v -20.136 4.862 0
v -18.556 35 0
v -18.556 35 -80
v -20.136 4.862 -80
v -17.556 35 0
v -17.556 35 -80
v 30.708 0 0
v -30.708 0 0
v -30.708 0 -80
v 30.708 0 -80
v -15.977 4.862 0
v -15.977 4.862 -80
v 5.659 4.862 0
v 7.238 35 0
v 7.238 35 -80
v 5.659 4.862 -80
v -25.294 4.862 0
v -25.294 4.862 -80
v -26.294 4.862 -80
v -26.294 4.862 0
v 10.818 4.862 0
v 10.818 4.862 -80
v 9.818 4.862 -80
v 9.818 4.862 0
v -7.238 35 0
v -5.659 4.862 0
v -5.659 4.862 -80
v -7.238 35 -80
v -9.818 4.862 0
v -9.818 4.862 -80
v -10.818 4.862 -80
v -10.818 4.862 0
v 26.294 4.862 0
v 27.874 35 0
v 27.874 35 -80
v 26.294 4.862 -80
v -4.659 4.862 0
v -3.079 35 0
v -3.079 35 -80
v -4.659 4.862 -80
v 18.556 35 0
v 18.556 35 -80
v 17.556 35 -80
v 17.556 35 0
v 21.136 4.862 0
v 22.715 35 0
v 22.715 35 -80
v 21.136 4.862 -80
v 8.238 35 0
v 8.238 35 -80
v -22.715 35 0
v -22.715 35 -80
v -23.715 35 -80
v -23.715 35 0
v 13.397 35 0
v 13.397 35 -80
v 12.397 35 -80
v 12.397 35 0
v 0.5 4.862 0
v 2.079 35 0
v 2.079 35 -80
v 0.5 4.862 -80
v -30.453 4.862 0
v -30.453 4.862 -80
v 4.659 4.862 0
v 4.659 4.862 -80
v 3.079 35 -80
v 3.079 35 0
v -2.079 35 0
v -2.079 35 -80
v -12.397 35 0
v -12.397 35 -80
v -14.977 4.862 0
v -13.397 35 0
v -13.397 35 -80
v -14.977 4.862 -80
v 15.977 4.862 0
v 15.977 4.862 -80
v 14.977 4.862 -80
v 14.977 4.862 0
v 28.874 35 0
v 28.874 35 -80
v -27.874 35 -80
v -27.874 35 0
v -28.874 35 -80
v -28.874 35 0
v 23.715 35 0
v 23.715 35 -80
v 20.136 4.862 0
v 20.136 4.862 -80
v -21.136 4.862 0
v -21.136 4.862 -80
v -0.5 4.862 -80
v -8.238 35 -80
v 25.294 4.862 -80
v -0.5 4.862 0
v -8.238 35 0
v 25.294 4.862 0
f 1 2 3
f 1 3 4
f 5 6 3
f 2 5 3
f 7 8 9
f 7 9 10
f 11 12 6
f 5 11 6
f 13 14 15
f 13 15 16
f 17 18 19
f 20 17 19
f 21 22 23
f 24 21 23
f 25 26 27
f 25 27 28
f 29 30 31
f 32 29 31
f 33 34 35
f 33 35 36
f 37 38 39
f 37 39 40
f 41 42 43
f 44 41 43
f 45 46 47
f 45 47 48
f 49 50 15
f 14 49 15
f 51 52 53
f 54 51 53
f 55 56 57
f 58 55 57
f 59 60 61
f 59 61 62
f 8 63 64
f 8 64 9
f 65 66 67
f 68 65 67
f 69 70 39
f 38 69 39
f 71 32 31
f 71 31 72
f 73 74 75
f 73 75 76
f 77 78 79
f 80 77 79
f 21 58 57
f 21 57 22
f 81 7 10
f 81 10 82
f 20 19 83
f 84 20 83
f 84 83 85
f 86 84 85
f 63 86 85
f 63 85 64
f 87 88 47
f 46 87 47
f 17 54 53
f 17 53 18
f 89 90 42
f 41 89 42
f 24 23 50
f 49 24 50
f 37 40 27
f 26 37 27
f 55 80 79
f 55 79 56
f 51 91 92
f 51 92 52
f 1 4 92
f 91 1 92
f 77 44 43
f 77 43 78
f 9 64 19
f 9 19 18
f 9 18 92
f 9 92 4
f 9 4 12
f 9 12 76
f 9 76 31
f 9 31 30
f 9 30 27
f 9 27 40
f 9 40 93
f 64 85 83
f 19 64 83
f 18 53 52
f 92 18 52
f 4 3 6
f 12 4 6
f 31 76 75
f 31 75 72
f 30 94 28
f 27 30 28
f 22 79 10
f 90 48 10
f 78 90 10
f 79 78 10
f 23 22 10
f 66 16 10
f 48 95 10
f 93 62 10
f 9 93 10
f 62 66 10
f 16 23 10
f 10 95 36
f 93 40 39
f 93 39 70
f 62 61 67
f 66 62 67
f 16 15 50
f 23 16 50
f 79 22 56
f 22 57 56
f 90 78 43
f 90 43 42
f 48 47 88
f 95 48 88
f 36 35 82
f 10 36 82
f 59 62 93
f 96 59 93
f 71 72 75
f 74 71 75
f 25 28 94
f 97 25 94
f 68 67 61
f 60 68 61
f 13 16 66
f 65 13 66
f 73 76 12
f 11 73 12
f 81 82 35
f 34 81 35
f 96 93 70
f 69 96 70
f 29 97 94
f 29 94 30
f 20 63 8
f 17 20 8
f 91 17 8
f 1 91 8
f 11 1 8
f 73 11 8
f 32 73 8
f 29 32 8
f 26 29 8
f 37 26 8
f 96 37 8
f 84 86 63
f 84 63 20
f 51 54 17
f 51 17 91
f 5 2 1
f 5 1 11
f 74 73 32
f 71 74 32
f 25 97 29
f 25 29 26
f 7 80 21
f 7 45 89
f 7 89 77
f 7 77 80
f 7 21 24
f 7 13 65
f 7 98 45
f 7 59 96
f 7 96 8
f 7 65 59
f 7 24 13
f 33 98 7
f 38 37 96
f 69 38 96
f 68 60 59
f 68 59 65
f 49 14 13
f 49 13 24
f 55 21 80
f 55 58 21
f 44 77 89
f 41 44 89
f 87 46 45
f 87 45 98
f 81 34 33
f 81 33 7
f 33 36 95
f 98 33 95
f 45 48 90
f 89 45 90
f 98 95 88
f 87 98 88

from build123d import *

# Parameters (mm, degrees)
DODANIE_WYCI_GNI_CIE1_DEPTH = 80


with BuildPart() as part:
    # Szkic1 → Dodanie-wyciągnięcie1 (new body)
    with BuildSketch(Plane.XY):
        Polygon((-30.708202586, 0), (30.708202586, 0), (28.873930311, 35), (27.873930311, 35), (26.294482101, 4.862332812), (25.294482101, 4.862332812), (23.715033891, 35), (22.715033891, 35), (21.135585681, 4.862332812), (20.135585681, 4.862332812), (18.556137471, 35), (17.556137471, 35), (15.976689261, 4.862332812), (14.976689261, 4.862332812), (13.39724105, 35), (12.39724105, 35), (10.81779284, 4.862332812), (9.81779284, 4.862332812), (8.23834463, 35), (7.23834463, 35), (5.65889642, 4.862332812), (4.65889642, 4.862332812), (3.07944821, 35), (2.07944821, 35), (0.5, 4.862332812), (-0.5, 4.862332812), (-2.07944821, 35), (-3.07944821, 35), (-4.65889642, 4.862332812), (-5.65889642, 4.862332812), (-7.23834463, 35), (-8.23834463, 35), (-9.81779284, 4.862332812), (-10.81779284, 4.862332812), (-12.39724105, 35), (-13.39724105, 35), (-14.976689261, 4.862332812), (-15.976689261, 4.862332812), (-17.556137471, 35), (-18.556137471, 35), (-20.135585681, 4.862332812), (-21.135585681, 4.862332812), (-22.715033891, 35), (-23.715033891, 35), (-25.294482101, 4.862332812), (-26.294482101, 4.862332812), (-27.873930311, 35), (-28.873930311, 35), (-30.453378521, 4.862332812), align=None)
    extrude(amount=-DODANIE_WYCI_GNI_CIE1_DEPTH)


solid = part.part
